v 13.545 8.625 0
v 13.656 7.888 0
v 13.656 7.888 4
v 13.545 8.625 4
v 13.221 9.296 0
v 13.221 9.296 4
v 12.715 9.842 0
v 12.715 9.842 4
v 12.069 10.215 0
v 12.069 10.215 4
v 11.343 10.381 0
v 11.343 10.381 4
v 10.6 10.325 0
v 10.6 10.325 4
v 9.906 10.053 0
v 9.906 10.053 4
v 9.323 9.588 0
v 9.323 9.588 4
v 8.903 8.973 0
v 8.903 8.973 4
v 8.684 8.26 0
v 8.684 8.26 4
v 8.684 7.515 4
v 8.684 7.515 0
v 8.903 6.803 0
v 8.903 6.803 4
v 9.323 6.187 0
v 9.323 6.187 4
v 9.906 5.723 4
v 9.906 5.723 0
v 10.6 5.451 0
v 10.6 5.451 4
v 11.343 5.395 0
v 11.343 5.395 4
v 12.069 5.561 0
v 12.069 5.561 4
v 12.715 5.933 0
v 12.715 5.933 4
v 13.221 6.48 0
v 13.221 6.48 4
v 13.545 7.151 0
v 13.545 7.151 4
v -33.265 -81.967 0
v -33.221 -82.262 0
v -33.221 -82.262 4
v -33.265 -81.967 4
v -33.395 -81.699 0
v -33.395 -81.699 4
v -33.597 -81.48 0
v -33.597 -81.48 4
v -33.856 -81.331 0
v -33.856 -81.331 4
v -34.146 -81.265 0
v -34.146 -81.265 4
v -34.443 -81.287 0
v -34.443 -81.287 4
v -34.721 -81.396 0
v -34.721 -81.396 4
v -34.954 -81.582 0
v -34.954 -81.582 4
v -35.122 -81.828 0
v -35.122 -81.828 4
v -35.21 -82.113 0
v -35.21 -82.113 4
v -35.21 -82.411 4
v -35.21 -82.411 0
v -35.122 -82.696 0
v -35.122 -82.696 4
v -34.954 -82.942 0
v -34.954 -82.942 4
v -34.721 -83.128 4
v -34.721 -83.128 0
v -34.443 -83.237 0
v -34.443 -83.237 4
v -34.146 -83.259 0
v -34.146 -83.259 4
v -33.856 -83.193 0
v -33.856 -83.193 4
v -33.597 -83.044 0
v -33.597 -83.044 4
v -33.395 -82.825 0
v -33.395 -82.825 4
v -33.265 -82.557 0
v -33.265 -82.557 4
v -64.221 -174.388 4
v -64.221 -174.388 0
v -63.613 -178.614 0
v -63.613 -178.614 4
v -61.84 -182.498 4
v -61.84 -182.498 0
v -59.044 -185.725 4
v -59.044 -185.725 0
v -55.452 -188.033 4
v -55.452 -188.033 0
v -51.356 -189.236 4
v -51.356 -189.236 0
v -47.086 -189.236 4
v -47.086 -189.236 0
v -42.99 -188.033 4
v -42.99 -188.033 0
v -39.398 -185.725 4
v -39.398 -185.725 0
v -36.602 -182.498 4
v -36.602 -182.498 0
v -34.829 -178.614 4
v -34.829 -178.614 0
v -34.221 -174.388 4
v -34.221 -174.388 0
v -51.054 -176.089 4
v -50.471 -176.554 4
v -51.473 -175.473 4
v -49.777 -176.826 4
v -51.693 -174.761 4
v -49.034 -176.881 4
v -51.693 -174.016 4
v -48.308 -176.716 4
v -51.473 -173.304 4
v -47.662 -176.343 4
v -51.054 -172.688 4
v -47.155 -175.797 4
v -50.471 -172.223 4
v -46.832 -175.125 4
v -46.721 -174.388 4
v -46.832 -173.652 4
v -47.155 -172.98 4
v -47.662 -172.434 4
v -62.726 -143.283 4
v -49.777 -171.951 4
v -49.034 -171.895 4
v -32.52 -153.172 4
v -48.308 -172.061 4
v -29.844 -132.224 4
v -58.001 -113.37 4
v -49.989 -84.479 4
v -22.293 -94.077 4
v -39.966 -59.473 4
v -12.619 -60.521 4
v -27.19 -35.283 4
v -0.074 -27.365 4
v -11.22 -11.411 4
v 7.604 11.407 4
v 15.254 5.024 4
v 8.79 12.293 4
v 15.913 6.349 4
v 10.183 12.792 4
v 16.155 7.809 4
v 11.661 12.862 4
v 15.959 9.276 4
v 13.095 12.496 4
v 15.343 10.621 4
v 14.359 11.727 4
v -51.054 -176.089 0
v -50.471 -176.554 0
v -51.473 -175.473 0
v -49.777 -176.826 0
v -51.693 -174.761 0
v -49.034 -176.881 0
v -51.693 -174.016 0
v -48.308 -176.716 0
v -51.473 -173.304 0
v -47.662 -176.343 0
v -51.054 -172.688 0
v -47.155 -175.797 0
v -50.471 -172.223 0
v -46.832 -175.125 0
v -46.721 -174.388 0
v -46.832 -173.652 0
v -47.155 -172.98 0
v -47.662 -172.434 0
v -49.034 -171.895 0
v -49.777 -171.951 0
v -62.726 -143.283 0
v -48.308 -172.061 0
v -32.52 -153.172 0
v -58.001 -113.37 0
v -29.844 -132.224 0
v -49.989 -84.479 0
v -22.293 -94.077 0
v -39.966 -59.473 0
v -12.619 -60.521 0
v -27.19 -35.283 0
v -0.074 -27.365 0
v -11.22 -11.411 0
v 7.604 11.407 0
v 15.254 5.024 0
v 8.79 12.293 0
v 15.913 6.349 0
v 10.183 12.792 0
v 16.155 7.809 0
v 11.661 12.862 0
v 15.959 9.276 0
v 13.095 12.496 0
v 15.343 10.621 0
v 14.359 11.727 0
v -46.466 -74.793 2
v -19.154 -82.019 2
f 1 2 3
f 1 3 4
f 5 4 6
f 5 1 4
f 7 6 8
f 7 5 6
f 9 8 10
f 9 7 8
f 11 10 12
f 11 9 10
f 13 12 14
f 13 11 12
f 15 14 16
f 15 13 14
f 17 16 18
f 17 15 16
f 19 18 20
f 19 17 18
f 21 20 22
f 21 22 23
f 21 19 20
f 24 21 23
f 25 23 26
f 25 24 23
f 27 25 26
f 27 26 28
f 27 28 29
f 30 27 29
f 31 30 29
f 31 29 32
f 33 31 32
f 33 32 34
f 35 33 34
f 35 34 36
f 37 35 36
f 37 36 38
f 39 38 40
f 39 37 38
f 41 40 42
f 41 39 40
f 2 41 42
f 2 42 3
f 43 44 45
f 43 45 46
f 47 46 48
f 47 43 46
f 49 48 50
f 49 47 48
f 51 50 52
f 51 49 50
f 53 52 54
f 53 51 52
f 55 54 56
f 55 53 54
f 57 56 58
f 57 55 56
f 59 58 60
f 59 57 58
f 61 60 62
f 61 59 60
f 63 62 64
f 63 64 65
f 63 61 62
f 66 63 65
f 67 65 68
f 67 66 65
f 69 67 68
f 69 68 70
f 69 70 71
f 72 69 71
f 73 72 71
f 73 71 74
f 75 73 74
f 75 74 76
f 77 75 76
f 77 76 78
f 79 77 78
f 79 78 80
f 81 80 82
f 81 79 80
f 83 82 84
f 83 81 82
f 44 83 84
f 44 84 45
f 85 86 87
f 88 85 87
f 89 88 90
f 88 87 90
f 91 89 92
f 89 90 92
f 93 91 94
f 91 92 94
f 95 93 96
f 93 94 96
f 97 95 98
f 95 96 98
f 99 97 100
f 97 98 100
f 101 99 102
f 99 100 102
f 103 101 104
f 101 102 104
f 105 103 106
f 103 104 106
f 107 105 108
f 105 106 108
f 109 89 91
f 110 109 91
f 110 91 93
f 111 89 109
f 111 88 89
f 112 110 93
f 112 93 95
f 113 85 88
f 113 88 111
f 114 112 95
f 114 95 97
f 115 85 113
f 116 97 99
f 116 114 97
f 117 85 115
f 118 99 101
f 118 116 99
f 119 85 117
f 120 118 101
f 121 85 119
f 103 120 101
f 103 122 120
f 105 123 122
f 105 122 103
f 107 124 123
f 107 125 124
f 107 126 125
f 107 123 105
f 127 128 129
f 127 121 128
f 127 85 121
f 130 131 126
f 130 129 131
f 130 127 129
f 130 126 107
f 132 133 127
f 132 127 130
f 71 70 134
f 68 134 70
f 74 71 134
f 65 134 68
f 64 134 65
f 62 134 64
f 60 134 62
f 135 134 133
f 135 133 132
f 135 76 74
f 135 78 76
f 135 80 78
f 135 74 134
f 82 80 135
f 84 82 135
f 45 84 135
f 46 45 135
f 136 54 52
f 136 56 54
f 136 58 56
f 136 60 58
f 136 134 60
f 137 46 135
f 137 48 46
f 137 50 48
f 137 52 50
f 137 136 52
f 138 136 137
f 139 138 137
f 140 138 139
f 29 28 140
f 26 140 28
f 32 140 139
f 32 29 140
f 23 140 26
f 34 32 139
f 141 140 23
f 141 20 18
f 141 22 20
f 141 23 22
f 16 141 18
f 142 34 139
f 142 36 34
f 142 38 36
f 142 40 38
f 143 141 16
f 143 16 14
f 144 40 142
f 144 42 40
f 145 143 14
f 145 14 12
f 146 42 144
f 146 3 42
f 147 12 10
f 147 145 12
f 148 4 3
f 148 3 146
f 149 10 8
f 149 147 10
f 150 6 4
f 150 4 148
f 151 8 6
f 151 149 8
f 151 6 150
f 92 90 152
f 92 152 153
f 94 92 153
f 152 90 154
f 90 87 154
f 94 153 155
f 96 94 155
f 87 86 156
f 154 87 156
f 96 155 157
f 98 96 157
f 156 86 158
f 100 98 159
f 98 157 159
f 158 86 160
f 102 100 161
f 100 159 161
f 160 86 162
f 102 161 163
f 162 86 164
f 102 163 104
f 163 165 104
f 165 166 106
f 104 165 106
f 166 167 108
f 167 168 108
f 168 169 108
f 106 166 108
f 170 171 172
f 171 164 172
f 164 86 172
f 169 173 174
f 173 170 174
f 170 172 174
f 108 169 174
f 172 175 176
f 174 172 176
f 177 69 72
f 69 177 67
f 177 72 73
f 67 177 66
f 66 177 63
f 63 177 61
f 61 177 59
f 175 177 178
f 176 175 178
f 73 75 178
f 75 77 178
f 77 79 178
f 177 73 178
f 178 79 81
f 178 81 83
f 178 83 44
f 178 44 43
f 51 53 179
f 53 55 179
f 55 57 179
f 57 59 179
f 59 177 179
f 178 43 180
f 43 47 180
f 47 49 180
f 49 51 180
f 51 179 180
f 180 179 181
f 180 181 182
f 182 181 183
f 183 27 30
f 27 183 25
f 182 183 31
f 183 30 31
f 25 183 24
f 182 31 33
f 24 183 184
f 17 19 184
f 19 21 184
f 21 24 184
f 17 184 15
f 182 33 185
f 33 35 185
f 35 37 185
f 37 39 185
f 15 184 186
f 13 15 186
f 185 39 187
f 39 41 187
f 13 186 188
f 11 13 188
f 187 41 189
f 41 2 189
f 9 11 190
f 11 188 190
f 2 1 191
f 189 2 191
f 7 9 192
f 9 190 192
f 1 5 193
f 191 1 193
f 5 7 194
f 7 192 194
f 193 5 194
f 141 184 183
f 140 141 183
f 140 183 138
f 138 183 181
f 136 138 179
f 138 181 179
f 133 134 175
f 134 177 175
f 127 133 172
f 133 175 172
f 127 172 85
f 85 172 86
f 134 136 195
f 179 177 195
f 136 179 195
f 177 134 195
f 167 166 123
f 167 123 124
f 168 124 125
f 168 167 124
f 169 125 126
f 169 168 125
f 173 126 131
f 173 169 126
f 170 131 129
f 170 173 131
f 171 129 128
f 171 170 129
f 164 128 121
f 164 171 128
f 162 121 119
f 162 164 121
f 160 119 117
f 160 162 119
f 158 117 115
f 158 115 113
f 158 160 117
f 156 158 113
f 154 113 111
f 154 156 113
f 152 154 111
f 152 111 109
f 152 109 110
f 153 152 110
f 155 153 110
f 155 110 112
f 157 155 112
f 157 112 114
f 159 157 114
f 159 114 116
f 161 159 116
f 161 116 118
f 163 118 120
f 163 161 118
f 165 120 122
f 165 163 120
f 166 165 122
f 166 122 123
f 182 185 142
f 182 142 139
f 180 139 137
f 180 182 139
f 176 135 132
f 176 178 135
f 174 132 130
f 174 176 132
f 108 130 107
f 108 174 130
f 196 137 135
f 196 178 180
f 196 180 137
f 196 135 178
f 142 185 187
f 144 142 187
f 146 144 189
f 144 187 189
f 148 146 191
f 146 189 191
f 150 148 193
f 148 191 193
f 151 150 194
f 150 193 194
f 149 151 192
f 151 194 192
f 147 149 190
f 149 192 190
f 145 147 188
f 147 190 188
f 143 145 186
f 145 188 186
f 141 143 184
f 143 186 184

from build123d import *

# Parameters (mm, degrees)
SKETCH1_R           = 2.5
SKETCH1_R_2         = 1
BOSS_EXTRUDE1_DEPTH = 4


with BuildPart() as part:
    # Sketch1 → Boss-Extrude1 (new body)
    with BuildSketch(Plane.XY):
        with BuildLine():
            ThreePointArc((15.254156194, 5.023677433), (14.359298867, 11.726874121), (7.604193017, 11.407248683))
            add(Edge.make_bspline(
                [(7.604193017, 11.407248683), (-64.624332124, -68.096129446), (-64.220975839, -174.388465928)],
                knots=[0, 0, 0, 1, 1, 1], degree=2))
            ThreePointArc((-64.220975839, -174.388465928), (-49.220975839, -189.388465928), (-34.220975839, -174.388465928))
            add(Edge.make_bspline(
                [(15.254156194, 5.023677433), (-28.824565765, -79.354910708), (-34.220975839, -174.388465928)],
                knots=[0, 0, 0, 1, 1, 1], degree=2))
        make_face()
        with Locations((11.155830006, 7.88789154)):
            Circle(SKETCH1_R, mode=Mode.SUBTRACT)
        with Locations((-34.220975839, -82.261849143)):
            Circle(SKETCH1_R_2, mode=Mode.SUBTRACT)
        with Locations((-49.220975839, -174.388465928)):
            Circle(SKETCH1_R, mode=Mode.SUBTRACT)
    extrude(amount=BOSS_EXTRUDE1_DEPTH)


solid = part.part
